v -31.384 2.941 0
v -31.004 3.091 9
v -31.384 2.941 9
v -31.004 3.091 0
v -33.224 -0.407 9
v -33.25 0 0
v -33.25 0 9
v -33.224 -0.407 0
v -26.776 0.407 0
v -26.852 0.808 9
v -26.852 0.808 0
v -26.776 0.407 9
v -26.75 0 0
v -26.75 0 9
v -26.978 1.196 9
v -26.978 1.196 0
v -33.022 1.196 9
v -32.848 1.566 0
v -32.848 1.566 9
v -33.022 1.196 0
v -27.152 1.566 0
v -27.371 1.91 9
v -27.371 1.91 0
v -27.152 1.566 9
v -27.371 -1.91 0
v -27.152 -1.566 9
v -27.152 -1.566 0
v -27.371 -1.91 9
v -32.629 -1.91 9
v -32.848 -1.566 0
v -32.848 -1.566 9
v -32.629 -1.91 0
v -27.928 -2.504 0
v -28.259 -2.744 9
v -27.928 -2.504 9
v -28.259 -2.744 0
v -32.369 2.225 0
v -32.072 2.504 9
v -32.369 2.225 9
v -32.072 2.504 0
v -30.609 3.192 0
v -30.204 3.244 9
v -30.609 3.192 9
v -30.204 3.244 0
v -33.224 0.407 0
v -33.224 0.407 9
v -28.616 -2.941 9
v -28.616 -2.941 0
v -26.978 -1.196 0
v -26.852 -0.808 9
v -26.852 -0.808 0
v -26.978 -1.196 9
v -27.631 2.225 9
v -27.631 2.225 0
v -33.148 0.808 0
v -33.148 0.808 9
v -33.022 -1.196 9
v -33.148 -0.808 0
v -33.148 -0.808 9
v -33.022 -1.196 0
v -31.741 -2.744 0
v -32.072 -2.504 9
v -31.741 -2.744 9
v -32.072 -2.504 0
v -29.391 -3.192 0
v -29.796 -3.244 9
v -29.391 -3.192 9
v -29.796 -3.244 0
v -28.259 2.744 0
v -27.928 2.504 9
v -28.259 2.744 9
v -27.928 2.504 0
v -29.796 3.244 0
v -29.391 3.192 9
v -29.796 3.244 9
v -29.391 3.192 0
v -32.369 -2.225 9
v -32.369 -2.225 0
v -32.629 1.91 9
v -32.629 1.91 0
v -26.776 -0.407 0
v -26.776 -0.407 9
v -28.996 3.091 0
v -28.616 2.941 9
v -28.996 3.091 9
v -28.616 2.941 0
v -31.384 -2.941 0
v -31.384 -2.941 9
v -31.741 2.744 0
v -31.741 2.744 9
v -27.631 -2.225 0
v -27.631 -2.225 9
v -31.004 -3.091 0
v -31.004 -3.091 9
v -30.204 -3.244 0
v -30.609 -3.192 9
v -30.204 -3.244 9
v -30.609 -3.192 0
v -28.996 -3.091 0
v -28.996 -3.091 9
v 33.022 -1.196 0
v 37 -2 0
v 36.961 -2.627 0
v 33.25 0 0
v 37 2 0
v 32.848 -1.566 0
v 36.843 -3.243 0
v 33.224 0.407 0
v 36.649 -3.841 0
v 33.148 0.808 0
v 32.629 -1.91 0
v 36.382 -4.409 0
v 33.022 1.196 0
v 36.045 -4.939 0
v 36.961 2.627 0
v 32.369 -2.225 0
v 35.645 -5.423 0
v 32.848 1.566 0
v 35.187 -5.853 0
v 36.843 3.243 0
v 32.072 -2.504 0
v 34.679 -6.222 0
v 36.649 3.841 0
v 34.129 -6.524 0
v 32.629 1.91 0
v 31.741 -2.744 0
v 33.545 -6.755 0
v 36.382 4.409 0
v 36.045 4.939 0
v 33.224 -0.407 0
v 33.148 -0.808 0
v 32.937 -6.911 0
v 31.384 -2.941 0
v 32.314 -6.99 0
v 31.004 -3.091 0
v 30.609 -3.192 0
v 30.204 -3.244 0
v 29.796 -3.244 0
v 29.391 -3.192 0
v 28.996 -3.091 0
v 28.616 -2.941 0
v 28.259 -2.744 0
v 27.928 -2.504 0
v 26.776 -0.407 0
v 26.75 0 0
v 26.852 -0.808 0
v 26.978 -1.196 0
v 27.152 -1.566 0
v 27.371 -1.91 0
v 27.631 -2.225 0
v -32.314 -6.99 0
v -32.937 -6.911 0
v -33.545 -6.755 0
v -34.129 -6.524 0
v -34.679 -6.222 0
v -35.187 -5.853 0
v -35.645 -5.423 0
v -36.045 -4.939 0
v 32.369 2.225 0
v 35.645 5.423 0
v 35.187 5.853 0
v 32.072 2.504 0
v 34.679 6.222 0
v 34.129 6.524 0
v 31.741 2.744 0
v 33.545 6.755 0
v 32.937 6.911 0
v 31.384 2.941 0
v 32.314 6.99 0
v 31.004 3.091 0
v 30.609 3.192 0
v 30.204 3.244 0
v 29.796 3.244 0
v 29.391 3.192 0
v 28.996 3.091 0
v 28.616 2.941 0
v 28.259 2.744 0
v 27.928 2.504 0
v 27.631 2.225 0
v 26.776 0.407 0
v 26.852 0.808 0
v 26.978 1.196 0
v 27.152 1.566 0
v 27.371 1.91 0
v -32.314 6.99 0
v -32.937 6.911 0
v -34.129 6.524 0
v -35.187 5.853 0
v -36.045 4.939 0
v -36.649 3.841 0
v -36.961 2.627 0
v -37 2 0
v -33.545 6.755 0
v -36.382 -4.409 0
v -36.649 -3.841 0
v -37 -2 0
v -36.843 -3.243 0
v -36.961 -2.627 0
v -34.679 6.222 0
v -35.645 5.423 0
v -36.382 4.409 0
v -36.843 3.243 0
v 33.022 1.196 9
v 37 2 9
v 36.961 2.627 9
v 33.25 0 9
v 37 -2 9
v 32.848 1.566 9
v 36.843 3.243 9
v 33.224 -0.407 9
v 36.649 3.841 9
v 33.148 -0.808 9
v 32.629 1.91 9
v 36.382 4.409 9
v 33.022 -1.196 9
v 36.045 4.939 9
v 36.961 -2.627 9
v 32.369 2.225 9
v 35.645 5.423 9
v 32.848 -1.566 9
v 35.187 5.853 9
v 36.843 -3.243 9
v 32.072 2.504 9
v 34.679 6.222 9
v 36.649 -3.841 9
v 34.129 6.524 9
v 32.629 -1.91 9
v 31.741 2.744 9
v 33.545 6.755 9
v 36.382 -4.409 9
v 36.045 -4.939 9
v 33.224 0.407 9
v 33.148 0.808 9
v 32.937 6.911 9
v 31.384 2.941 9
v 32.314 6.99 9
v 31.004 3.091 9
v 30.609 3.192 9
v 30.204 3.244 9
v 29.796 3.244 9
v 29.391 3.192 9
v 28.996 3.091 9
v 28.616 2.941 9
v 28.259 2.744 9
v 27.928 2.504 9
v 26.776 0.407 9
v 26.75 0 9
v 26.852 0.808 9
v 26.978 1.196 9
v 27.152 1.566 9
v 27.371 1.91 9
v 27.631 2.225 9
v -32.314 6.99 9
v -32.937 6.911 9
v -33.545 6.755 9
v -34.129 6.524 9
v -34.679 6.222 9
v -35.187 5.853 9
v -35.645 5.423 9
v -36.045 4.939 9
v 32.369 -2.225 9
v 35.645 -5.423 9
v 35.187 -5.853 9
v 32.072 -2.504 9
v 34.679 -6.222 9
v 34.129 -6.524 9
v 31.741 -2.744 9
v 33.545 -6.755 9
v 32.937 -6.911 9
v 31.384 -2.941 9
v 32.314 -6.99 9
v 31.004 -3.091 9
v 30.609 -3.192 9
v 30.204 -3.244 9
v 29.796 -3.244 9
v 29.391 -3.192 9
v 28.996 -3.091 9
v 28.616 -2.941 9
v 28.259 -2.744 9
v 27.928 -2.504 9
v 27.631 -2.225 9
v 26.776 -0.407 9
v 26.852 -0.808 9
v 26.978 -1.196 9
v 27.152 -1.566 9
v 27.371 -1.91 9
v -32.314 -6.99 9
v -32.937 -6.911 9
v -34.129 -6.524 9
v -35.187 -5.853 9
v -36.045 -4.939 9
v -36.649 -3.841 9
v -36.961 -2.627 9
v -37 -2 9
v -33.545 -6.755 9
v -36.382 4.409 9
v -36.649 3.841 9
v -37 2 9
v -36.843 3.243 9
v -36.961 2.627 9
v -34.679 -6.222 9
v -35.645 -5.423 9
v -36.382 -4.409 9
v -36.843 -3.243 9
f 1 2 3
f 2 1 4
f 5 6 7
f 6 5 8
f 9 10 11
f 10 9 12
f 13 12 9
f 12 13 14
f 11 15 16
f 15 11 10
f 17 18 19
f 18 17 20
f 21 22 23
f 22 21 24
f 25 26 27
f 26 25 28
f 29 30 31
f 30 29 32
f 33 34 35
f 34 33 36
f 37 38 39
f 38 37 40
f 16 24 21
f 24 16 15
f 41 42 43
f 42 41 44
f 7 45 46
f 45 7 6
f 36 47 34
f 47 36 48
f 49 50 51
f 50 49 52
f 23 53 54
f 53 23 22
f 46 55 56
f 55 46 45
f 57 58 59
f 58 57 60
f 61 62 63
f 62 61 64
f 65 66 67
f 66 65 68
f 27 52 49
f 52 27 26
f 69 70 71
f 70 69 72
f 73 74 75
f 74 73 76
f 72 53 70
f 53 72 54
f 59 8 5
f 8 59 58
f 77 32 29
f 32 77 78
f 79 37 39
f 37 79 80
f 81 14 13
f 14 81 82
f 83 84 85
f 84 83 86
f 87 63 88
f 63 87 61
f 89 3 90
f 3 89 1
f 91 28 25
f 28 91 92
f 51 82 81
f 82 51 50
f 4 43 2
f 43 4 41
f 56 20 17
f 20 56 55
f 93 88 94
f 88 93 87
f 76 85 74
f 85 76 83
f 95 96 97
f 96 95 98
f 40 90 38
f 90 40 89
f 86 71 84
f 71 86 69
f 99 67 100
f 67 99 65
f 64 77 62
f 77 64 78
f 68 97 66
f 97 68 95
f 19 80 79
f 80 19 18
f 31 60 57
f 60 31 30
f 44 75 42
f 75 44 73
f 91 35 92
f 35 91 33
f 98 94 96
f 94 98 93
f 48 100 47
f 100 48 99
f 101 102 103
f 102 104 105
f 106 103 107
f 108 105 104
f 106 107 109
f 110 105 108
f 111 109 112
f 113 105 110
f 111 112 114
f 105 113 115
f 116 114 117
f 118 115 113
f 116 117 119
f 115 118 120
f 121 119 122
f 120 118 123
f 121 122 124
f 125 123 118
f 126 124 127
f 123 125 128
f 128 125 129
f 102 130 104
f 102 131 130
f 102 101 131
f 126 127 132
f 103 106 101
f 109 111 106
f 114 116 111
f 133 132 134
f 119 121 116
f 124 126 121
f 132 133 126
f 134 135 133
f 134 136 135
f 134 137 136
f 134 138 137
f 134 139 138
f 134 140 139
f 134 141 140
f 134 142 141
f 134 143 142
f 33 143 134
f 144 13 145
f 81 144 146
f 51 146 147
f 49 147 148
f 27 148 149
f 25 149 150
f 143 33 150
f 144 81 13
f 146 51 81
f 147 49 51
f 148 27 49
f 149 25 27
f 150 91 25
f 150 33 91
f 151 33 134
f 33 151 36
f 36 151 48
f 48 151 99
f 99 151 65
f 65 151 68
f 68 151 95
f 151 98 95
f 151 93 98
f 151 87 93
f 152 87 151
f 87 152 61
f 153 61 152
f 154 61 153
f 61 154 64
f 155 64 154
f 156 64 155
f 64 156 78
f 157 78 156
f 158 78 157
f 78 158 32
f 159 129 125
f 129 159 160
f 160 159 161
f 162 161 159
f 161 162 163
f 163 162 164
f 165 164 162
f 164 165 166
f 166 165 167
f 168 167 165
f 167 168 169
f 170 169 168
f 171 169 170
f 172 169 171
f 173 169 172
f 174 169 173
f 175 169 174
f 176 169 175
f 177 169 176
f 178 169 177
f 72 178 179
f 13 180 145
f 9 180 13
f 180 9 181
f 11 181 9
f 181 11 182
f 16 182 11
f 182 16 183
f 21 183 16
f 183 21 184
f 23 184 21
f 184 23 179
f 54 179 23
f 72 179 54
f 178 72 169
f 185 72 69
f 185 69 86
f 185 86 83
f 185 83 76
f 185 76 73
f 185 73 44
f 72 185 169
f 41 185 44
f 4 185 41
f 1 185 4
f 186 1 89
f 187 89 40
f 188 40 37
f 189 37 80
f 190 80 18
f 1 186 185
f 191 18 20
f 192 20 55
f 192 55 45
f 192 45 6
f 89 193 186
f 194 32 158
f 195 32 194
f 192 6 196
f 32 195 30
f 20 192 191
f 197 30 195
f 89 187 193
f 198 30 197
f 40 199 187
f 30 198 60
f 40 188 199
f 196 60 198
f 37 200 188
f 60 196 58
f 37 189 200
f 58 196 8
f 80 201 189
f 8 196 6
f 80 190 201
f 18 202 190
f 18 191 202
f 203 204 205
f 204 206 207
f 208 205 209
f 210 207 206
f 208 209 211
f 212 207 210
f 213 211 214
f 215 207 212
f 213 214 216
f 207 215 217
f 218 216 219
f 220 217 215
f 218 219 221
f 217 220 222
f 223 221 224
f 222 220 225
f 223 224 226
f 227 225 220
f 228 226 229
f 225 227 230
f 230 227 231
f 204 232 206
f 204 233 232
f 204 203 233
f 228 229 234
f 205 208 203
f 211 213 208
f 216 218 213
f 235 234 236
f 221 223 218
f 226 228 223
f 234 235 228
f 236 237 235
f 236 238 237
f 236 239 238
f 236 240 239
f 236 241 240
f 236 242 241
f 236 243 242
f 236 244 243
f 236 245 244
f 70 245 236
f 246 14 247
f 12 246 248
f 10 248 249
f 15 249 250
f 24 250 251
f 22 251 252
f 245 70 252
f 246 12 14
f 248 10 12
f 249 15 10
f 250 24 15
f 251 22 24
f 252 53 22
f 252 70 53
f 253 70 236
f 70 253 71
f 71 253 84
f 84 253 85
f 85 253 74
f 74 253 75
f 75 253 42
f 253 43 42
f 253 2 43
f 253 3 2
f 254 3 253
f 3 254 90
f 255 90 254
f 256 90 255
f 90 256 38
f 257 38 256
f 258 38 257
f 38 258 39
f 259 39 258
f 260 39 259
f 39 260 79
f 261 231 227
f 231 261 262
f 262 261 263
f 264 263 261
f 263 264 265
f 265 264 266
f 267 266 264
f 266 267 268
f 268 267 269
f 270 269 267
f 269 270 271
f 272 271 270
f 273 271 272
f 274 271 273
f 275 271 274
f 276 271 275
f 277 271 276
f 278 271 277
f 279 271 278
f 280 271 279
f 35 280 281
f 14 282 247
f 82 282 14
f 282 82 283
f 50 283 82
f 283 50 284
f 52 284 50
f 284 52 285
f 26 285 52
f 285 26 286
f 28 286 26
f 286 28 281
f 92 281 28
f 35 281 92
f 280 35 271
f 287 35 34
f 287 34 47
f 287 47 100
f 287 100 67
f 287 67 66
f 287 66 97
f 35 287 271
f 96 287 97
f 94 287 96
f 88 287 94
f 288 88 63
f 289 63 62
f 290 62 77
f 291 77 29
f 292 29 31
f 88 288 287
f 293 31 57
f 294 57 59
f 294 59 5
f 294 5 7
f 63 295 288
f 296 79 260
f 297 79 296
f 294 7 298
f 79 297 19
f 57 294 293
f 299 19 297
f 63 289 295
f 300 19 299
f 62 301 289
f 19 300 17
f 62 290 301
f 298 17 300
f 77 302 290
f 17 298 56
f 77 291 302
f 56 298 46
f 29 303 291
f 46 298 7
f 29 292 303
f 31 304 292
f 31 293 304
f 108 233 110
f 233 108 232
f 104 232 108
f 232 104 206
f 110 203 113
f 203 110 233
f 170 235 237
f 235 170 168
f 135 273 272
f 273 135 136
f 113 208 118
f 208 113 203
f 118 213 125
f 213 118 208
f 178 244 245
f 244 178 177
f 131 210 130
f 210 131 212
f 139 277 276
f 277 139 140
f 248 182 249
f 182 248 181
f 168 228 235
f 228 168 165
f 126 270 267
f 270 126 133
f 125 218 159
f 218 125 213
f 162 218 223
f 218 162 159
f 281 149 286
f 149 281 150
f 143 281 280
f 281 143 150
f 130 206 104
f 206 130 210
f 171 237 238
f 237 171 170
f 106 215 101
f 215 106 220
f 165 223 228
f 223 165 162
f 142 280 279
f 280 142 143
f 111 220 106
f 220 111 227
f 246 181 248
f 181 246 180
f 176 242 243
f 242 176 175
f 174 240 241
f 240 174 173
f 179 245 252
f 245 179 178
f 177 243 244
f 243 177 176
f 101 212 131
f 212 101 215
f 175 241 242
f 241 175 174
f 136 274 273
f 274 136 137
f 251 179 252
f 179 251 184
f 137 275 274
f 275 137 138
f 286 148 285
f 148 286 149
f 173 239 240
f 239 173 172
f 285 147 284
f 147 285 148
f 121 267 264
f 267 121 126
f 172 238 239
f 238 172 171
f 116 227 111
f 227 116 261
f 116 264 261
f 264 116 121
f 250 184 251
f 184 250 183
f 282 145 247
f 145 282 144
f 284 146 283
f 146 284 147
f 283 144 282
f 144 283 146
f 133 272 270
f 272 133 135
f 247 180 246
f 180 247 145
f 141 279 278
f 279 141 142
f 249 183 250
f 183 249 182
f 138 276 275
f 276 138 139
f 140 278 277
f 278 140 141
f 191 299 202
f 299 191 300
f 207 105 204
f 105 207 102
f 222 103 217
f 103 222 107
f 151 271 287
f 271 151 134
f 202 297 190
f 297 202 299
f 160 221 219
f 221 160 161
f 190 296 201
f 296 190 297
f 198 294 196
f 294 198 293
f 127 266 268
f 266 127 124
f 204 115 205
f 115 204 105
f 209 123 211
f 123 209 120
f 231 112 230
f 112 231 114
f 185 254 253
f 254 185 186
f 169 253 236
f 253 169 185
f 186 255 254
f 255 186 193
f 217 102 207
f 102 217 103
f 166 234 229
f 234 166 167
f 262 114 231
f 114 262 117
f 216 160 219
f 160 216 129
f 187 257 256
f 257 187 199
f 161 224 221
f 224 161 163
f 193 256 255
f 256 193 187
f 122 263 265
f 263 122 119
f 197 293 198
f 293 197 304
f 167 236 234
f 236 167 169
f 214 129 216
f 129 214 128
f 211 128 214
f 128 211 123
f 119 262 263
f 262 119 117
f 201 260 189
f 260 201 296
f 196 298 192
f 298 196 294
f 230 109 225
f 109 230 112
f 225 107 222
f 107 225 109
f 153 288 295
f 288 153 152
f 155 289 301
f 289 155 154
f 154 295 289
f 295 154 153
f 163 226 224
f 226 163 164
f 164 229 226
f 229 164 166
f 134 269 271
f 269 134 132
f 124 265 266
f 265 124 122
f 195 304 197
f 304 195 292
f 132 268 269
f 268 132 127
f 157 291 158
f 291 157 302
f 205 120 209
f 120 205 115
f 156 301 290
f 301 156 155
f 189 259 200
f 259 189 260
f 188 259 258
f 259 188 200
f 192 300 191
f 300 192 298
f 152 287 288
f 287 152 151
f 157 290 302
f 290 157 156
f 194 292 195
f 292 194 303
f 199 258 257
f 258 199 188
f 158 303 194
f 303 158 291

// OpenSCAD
$fn = 50;


difference() {
	union() {
		hull() {
			translate(v = [-32.0000000000, 2.0000000000, 0]) {
				cylinder(h = 9, r = 5);
			}
			translate(v = [32.0000000000, 2.0000000000, 0]) {
				cylinder(h = 9, r = 5);
			}
			translate(v = [-32.0000000000, -2.0000000000, 0]) {
				cylinder(h = 9, r = 5);
			}
			translate(v = [32.0000000000, -2.0000000000, 0]) {
				cylinder(h = 9, r = 5);
			}
		}
	}
	union() {
		translate(v = [-30.0000000000, 0.0000000000, 0]) {
			cylinder(h = 9, r = 3.2500000000);
		}
		translate(v = [30.0000000000, 0.0000000000, 0]) {
			cylinder(h = 9, r = 3.2500000000);
		}
		translate(v = [-30.0000000000, 0.0000000000, 0]) {
			cylinder(h = 9, r = 1.8000000000);
		}
		translate(v = [30.0000000000, 0.0000000000, 0]) {
			cylinder(h = 9, r = 1.8000000000);
		}
		translate(v = [-30.0000000000, 0.0000000000, 0]) {
			cylinder(h = 9, r = 1.8000000000);
		}
		translate(v = [30.0000000000, 0.0000000000, 0]) {
			cylinder(h = 9, r = 1.8000000000);
		}
		translate(v = [-30.0000000000, 0.0000000000, 0]) {
			cylinder(h = 9, r = 1.8000000000);
		}
		translate(v = [30.0000000000, 0.0000000000, 0]) {
			cylinder(h = 9, r = 1.8000000000);
		}
	}
}
